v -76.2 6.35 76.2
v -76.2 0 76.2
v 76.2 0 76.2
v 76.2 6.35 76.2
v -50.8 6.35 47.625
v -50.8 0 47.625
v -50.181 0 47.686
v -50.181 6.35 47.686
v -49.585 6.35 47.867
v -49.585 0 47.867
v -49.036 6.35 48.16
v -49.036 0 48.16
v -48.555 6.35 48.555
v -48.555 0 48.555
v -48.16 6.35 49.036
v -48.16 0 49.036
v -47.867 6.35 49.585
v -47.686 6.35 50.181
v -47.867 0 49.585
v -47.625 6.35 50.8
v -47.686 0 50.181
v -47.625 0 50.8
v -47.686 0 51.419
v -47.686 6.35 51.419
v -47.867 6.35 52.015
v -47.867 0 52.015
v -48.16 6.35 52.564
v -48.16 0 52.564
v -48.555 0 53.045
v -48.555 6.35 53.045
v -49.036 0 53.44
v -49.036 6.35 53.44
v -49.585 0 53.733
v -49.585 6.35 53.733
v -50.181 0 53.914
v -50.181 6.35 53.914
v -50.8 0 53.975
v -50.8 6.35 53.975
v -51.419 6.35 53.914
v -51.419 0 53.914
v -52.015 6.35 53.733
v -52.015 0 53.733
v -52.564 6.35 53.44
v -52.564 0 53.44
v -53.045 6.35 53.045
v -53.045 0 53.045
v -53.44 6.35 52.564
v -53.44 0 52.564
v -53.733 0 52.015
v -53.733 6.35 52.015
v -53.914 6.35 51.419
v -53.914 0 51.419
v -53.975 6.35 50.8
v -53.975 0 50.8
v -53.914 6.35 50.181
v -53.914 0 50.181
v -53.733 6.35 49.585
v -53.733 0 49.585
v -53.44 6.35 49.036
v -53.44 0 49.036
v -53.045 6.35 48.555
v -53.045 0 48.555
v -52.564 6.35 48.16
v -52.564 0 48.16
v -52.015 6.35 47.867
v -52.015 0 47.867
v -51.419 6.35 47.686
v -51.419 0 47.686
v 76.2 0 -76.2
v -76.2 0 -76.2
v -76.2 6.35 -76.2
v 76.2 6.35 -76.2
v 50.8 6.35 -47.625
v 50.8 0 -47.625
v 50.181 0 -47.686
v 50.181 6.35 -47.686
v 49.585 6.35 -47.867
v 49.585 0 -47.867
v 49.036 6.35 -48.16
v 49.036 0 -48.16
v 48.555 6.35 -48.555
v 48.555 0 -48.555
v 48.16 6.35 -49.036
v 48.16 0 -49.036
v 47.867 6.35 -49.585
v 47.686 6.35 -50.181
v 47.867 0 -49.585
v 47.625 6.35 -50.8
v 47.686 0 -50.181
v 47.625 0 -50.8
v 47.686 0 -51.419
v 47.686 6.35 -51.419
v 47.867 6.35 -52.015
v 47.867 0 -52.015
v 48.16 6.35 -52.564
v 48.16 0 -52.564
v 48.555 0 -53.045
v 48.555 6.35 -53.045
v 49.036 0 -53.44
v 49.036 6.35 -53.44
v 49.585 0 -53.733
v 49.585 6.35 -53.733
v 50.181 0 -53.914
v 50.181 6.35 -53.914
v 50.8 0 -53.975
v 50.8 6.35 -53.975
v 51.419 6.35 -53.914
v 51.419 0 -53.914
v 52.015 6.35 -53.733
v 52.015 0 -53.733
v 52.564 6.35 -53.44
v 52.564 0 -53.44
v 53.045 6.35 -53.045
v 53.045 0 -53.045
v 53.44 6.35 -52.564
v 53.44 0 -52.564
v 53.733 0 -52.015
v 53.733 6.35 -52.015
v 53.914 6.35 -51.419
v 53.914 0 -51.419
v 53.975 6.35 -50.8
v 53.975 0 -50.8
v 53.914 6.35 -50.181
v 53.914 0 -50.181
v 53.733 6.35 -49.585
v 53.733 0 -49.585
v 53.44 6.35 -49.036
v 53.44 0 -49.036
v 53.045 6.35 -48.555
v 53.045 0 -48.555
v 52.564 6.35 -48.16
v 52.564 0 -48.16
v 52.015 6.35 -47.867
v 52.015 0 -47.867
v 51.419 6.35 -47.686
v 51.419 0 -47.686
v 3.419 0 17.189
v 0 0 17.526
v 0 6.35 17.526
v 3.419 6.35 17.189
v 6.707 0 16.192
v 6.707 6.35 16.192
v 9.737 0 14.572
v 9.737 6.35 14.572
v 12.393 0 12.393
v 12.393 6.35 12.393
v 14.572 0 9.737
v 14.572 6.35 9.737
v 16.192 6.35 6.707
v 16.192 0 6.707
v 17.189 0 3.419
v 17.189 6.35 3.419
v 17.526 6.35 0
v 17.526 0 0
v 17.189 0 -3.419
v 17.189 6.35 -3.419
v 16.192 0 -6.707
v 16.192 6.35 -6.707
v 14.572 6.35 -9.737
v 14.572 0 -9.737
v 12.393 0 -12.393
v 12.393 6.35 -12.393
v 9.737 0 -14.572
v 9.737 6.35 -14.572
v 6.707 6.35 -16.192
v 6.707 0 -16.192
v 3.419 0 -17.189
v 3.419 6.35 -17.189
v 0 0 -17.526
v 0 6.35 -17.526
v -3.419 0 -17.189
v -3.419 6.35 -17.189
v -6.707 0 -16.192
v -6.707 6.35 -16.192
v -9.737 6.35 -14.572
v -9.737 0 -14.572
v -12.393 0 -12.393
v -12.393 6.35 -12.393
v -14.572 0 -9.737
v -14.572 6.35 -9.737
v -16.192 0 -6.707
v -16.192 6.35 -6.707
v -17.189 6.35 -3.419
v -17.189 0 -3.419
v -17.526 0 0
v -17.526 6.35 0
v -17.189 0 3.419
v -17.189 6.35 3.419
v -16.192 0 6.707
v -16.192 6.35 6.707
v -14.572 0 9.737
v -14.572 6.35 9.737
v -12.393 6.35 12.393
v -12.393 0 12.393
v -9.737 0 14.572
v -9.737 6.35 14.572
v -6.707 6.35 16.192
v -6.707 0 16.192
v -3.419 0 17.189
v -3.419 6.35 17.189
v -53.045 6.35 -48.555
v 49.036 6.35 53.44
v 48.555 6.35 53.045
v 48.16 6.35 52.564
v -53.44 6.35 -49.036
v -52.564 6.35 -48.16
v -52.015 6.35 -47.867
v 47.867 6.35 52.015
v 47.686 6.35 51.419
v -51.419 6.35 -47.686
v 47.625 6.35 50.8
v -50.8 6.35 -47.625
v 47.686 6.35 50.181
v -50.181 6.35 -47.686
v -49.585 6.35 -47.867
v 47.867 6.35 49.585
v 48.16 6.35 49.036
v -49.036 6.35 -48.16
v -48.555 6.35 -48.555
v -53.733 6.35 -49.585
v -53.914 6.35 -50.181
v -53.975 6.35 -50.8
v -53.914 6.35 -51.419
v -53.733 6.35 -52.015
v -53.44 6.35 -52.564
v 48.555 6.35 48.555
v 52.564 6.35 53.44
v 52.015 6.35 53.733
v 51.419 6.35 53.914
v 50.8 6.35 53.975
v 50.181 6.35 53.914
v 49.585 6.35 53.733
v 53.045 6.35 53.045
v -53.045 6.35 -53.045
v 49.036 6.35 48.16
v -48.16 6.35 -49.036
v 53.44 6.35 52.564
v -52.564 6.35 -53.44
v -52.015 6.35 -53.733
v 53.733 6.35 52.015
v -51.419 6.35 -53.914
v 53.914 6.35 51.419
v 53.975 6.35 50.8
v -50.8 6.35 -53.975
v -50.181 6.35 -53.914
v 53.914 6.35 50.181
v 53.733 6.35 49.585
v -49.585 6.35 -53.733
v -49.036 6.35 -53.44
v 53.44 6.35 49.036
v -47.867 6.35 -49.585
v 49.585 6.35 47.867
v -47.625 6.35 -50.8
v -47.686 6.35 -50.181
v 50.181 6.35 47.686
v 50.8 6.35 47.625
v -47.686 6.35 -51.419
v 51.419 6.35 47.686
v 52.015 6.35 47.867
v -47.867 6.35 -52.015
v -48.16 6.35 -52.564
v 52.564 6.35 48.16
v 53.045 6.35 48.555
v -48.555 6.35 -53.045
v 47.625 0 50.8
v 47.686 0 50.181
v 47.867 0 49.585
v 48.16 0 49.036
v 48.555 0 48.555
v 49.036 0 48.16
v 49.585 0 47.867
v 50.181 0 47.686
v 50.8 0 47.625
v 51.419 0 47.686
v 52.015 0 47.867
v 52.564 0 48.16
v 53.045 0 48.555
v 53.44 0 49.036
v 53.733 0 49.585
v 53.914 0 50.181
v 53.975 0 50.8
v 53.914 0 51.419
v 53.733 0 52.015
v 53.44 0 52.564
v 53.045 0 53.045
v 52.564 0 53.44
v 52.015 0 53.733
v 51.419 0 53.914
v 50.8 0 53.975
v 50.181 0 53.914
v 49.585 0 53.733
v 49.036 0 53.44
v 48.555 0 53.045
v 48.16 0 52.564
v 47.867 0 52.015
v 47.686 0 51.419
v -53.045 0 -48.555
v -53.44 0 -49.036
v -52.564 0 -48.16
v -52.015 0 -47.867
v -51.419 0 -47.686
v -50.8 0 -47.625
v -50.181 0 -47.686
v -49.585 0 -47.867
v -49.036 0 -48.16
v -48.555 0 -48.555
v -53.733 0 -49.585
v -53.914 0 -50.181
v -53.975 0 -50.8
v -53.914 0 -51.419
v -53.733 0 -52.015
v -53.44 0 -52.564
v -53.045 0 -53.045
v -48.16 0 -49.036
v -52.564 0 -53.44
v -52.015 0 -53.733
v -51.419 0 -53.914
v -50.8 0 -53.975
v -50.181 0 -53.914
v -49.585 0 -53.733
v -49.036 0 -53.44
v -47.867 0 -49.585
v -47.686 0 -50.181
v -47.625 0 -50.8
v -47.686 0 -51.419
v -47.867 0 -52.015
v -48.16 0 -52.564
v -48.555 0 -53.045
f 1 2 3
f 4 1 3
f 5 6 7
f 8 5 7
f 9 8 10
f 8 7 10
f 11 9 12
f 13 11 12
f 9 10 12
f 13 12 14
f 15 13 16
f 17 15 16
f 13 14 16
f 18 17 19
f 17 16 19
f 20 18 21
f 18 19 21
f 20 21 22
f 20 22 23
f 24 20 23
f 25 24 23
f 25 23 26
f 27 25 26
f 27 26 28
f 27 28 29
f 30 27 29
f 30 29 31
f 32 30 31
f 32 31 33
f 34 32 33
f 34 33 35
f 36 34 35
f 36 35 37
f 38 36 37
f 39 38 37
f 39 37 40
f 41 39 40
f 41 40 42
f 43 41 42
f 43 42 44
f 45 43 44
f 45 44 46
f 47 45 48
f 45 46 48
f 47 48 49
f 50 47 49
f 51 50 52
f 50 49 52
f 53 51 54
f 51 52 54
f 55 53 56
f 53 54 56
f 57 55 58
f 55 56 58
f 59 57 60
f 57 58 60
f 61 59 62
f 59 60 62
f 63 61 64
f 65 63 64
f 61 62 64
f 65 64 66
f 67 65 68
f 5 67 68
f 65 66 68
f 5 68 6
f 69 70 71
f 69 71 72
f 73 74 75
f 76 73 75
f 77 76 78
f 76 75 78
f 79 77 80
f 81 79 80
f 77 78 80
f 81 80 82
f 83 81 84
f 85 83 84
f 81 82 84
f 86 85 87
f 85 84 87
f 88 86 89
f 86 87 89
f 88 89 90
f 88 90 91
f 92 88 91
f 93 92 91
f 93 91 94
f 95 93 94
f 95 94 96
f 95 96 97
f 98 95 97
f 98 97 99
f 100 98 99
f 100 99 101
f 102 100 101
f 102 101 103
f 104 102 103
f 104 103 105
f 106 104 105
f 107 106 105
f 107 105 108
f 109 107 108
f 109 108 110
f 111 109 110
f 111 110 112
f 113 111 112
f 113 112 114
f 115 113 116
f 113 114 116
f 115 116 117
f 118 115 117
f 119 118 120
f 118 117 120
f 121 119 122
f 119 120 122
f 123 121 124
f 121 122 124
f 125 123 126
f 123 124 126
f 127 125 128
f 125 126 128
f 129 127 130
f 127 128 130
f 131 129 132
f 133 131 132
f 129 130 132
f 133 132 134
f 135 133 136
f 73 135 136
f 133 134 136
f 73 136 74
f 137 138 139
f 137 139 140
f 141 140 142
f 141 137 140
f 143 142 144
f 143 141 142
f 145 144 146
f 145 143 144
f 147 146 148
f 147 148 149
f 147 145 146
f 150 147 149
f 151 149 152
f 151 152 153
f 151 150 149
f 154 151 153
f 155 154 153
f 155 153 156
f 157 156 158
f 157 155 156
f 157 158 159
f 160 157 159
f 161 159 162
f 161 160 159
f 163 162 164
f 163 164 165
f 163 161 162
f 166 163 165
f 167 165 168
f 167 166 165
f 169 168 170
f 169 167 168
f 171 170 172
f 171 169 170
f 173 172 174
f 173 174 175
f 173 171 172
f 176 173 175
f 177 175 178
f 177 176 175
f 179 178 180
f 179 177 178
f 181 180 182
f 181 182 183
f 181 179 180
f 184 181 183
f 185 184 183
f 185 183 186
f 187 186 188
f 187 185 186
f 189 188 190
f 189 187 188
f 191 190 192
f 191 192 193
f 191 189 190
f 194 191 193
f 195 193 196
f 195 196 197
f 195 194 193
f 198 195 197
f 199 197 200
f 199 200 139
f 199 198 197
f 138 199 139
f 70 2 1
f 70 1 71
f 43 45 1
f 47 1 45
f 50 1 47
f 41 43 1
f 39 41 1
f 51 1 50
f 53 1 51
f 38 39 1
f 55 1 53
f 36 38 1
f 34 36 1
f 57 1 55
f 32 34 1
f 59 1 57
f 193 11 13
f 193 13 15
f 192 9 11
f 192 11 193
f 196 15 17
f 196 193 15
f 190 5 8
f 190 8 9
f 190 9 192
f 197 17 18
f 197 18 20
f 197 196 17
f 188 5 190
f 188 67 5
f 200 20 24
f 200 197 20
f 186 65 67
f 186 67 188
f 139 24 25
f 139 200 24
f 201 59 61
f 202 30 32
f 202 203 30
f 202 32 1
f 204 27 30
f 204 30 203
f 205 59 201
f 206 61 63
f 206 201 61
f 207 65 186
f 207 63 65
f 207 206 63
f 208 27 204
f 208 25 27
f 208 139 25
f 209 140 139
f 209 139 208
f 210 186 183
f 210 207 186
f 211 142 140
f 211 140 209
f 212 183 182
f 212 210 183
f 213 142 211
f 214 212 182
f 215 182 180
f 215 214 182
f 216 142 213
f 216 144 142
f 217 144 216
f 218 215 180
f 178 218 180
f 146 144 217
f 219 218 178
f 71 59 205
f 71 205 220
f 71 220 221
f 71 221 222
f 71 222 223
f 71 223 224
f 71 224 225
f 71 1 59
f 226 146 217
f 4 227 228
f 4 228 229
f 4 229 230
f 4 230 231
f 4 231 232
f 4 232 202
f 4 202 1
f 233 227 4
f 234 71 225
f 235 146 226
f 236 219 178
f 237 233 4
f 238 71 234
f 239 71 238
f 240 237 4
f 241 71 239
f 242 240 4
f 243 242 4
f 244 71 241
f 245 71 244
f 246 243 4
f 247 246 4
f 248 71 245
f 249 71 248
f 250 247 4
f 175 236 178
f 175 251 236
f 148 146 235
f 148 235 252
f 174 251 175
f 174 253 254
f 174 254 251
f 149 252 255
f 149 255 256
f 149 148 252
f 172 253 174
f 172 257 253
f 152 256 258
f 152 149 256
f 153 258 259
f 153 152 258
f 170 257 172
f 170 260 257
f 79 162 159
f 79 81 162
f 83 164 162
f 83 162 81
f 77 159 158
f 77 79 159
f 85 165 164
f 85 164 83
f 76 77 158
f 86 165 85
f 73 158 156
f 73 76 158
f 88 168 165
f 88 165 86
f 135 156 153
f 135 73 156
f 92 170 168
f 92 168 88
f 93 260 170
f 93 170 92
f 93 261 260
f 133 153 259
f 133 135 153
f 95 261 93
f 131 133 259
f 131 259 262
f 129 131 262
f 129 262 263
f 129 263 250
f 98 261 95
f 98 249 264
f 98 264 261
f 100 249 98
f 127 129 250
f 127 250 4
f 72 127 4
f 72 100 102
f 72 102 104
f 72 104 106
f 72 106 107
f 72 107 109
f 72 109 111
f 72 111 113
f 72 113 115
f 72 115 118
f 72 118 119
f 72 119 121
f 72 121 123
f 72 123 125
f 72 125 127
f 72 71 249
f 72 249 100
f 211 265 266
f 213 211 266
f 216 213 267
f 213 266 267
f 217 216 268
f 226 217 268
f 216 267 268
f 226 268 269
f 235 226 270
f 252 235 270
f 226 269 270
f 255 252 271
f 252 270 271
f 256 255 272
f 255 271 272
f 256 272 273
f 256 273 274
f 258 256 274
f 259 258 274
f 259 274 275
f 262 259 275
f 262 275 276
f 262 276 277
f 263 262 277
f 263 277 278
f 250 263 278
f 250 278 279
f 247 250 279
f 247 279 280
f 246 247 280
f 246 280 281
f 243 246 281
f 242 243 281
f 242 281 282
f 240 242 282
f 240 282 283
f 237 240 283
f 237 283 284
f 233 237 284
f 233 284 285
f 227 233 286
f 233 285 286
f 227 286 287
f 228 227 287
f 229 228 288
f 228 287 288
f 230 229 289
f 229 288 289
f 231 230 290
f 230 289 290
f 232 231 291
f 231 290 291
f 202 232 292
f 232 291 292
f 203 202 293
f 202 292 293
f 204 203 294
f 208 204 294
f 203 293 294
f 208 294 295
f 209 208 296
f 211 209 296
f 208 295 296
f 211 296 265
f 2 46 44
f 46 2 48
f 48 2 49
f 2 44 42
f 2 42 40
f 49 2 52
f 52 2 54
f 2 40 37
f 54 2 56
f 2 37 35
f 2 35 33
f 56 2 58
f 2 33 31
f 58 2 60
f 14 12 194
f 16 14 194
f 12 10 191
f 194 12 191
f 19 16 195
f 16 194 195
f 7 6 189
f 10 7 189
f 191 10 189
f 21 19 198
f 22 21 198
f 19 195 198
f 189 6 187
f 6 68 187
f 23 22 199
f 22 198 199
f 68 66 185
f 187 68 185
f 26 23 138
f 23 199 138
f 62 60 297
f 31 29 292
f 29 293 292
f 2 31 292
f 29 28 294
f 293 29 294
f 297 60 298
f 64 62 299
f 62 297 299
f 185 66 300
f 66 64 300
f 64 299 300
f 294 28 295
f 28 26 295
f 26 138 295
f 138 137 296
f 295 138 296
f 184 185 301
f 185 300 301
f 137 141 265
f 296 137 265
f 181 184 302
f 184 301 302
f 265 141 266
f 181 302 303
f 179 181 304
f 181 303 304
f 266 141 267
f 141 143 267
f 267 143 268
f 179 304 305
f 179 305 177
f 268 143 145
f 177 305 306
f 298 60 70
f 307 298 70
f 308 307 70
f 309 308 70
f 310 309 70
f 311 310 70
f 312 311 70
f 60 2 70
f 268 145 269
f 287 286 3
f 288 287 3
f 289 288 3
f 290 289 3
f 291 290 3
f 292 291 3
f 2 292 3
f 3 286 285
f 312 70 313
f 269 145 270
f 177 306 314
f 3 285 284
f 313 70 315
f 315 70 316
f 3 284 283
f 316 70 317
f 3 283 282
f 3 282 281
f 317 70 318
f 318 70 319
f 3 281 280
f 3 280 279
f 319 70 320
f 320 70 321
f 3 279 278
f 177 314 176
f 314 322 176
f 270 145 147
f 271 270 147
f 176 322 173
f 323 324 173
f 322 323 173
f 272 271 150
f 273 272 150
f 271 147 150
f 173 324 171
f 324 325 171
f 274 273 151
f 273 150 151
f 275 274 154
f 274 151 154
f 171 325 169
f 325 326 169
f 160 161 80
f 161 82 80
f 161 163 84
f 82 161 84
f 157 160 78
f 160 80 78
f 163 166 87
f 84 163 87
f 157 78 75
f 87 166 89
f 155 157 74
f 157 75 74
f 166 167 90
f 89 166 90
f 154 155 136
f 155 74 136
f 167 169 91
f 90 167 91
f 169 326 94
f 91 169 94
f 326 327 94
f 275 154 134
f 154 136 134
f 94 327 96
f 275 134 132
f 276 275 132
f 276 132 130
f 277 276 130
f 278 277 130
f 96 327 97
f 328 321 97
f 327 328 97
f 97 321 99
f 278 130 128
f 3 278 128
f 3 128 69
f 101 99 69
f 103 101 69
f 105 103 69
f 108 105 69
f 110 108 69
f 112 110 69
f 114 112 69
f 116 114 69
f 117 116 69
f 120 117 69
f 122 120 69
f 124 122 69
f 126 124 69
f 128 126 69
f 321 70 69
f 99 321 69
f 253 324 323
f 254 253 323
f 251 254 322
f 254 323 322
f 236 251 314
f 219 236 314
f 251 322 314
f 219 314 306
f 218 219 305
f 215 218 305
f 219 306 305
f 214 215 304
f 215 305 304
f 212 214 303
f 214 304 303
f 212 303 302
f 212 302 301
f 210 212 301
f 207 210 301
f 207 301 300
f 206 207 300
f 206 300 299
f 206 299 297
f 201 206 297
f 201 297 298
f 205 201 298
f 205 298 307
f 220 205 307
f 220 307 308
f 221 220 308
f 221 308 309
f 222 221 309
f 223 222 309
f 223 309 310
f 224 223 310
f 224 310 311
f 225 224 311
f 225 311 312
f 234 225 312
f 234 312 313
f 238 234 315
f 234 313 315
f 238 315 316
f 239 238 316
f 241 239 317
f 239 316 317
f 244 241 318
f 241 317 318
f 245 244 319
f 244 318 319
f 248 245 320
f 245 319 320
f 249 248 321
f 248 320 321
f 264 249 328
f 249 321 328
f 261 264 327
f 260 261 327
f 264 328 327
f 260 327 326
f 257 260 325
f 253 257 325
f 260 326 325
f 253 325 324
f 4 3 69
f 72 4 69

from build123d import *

# Parameters (mm, degrees)
SKETCH1_W                   = 152.4
SKETCH1_H                   = 152.4
SKETCH1_R                   = 17.526
BASE_DEPTH                  = 6.35
F_1_4_0_25_DIAMETER_HOLE1_D = 6.35
CIRPATTERN1_COUNT           = 4


with BuildPart() as part:
    # Sketch1 → Base (new body)
    with BuildSketch(Plane(origin=(0, 0, 0), x_dir=(1, 0, 0), z_dir=(0, 1, 0))):
        Rectangle(SKETCH1_W, SKETCH1_H)
        with Locations(Location((0, 0, 0), (0, 0, 270))):
            Circle(SKETCH1_R, mode=Mode.SUBTRACT)
    extrude(amount=BASE_DEPTH)

    # 1/4 (0.25) Diameter Hole1 (through all)
    with Locations(Plane(origin=(0, 6.35, 0), x_dir=(1, 0, 0), z_dir=(0, 1, 0))):
        with Locations((50.8, -50.8)):
            f_1_4_0_25_diameter_hole1 = Hole(F_1_4_0_25_DIAMETER_HOLE1_D / 2)

    # CirPattern1: 1/4 (0.25) Diameter Hole1 ×4 about axis
    cirpattern1_axis = Axis((0, 0, 0), (0, 1, 0))
    for i in range(1, CIRPATTERN1_COUNT):
        add(f_1_4_0_25_diameter_hole1.rotate(cirpattern1_axis, i * 360 / CIRPATTERN1_COUNT), mode=Mode.SUBTRACT)


solid = part.part
